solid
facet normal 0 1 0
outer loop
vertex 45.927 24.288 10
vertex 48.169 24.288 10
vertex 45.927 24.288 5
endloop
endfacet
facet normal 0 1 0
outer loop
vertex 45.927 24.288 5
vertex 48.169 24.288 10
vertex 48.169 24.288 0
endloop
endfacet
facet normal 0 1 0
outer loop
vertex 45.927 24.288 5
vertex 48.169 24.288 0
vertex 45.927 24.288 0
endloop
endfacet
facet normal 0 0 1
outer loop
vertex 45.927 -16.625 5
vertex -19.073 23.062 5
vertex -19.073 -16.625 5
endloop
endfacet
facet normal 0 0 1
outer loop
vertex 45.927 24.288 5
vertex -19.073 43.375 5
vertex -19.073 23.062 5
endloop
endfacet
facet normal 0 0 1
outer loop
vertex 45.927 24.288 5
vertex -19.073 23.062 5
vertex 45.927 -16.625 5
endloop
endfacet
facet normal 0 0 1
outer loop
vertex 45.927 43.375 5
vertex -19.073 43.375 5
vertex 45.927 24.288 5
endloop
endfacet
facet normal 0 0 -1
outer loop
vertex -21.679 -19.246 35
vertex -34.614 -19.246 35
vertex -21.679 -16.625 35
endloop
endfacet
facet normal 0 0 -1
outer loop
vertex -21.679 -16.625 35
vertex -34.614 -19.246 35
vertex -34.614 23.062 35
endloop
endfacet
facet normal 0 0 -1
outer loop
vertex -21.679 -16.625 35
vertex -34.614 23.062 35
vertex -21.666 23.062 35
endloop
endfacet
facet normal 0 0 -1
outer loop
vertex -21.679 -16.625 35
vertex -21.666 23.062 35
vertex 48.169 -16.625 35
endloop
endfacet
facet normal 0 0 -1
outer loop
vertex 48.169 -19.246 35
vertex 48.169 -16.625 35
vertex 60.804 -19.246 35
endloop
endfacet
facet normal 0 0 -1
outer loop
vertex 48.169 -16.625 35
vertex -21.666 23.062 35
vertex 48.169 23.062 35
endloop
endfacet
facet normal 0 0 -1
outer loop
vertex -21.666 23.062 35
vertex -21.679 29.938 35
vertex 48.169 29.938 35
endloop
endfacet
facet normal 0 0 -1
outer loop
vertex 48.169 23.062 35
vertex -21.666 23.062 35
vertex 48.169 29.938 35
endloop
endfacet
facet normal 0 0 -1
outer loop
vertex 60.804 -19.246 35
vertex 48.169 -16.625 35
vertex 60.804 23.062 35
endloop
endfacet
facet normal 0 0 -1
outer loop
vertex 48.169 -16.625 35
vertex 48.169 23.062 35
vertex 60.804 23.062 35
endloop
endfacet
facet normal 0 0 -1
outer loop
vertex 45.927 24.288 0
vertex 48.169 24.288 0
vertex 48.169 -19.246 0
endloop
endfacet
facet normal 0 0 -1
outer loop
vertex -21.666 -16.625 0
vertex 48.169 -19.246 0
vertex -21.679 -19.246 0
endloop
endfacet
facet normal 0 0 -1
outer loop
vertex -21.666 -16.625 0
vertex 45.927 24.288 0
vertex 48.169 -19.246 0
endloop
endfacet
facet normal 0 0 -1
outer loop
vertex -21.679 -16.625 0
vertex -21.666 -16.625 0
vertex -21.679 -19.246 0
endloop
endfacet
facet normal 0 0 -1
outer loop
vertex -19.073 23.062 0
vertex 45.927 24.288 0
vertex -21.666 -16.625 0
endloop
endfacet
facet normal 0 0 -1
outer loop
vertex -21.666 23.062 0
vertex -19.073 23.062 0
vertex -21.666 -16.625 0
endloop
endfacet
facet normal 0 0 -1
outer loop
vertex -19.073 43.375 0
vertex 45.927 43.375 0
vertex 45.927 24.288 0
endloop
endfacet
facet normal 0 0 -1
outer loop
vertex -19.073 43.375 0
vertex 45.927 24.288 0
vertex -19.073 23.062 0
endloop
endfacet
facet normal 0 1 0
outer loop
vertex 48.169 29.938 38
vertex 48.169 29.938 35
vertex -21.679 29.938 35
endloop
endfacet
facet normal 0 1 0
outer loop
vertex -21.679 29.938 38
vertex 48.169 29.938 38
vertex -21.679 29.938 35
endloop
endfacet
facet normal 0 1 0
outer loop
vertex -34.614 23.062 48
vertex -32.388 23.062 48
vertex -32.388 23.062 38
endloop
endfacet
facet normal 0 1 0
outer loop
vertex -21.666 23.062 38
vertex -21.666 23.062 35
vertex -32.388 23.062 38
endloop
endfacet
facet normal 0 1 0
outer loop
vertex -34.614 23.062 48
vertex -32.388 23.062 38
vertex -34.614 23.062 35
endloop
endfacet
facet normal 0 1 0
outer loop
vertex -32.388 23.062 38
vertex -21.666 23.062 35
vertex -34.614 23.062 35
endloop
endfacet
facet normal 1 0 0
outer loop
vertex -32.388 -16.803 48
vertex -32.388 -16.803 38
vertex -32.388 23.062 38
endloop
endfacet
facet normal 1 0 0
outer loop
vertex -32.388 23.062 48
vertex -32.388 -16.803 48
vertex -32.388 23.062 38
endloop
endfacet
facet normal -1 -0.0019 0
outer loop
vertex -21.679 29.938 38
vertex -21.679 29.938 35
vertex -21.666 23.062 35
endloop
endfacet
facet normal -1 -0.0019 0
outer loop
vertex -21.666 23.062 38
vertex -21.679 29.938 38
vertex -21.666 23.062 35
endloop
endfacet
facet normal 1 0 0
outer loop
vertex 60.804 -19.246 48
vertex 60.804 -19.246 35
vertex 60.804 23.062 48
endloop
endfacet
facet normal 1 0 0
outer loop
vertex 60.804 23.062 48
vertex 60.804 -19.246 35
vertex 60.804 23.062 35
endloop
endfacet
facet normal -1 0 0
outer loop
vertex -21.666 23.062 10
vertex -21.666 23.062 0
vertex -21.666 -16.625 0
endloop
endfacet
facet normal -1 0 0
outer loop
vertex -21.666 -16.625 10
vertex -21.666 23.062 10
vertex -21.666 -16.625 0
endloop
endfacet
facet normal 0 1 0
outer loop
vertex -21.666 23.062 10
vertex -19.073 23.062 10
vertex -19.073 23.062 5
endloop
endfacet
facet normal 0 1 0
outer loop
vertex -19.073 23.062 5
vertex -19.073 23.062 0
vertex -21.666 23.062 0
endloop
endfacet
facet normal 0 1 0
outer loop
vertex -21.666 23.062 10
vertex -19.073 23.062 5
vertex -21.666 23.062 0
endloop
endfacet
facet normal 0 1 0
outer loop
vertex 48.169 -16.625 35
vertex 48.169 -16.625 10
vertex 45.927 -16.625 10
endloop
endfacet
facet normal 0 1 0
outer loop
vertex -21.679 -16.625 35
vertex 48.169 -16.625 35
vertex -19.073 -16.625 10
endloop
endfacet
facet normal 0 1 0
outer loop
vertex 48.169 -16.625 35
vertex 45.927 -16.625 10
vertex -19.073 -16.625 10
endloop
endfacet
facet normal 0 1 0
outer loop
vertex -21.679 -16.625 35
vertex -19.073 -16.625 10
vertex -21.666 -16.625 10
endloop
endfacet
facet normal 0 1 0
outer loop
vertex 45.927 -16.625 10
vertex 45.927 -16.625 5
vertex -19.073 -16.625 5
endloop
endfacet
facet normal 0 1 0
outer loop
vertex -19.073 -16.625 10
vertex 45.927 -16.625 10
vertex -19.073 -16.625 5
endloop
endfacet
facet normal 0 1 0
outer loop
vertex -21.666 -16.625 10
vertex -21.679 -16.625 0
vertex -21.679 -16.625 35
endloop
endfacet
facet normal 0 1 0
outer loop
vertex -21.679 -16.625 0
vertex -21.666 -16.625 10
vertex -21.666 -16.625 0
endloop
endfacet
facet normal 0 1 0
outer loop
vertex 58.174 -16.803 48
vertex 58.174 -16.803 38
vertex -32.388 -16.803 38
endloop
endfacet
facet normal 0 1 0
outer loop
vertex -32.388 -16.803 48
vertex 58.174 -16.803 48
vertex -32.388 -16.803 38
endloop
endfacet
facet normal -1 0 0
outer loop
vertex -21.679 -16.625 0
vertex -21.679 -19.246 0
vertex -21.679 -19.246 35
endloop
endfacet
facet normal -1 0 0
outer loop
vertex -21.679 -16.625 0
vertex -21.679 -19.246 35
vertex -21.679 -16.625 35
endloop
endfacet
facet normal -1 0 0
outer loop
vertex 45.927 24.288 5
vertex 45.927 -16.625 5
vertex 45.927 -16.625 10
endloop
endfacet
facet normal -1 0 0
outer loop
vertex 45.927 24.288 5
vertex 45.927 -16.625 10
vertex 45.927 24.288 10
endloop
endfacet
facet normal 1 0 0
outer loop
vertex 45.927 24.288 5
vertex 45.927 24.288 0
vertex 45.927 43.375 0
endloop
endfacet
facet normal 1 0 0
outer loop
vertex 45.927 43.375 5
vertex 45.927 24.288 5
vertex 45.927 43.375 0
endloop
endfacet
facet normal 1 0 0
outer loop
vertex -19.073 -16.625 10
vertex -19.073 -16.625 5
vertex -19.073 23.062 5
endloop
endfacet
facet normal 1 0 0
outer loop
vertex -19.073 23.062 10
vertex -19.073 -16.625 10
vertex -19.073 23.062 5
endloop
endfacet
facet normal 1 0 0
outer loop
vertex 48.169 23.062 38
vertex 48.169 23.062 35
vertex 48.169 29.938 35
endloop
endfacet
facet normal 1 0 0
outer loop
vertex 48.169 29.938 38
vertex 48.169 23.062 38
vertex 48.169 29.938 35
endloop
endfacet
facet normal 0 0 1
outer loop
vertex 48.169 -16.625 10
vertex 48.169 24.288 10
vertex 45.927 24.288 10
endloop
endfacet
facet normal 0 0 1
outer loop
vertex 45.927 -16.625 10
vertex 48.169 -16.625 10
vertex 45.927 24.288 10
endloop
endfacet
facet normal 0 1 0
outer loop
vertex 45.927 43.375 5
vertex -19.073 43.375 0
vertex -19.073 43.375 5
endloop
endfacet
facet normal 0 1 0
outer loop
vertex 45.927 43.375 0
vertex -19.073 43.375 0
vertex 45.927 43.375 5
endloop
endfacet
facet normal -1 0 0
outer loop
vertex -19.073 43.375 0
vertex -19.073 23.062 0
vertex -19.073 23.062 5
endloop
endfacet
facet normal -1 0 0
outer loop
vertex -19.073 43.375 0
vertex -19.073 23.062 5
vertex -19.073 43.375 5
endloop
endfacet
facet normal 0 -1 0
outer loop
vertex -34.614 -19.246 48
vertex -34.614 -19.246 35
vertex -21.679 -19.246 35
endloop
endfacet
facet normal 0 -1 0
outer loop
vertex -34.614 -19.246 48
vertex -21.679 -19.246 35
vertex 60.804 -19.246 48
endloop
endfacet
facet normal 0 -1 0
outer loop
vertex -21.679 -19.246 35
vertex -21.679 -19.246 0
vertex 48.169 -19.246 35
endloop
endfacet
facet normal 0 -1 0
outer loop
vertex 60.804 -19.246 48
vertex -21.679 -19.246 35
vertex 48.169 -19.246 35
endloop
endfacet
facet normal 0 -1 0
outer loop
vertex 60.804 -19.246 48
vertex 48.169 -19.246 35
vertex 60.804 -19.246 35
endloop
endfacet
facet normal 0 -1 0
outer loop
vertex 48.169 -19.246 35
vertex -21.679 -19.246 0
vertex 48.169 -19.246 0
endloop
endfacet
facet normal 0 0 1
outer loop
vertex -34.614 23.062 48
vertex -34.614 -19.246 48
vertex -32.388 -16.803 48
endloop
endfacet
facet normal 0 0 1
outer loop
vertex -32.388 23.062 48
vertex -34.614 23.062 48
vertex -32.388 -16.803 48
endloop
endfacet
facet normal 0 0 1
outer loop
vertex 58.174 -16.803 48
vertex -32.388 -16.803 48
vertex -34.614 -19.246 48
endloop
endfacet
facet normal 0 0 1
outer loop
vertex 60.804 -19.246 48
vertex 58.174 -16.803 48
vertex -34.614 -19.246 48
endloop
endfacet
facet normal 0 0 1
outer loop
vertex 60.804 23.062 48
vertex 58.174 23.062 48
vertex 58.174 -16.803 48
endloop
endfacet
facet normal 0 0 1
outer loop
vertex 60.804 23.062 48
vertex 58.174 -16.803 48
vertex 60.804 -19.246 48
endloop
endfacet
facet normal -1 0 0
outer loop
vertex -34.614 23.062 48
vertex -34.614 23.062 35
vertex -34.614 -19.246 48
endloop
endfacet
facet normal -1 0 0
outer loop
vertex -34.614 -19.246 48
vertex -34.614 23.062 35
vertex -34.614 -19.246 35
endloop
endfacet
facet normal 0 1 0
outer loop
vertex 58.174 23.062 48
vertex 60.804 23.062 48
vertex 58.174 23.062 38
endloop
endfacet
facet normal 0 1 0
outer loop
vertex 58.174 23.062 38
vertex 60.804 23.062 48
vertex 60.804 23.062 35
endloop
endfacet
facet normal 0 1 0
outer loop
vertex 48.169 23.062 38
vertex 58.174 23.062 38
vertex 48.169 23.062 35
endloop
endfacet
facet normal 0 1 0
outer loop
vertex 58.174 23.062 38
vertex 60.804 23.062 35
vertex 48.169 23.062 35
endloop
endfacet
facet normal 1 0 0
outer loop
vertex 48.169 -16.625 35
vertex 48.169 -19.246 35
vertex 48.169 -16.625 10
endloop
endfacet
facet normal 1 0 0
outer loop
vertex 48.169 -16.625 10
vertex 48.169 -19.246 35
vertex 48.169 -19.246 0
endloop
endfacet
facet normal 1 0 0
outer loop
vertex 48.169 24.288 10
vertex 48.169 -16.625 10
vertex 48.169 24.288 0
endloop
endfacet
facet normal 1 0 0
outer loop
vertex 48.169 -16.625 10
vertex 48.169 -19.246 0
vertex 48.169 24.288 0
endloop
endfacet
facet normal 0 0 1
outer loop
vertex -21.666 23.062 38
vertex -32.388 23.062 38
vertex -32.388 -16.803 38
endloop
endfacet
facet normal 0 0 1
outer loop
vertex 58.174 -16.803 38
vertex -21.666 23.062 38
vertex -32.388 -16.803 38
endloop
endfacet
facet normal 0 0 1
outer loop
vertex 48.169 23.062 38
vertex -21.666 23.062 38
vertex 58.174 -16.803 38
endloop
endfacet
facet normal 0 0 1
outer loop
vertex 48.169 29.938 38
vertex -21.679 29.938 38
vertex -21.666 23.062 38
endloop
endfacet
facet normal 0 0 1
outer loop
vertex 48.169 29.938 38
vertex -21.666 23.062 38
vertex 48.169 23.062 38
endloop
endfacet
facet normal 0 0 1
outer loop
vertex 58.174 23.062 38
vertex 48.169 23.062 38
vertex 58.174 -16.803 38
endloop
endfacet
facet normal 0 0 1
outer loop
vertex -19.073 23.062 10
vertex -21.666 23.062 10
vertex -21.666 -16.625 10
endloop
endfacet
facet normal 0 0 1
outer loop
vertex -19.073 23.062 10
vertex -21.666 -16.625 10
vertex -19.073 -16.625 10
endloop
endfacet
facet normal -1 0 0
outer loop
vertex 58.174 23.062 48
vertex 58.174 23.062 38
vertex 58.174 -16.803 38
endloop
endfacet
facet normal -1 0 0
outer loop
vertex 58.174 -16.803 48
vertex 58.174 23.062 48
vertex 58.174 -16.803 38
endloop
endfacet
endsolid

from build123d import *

# Parameters (mm, degrees)
SKETCH_1_W      = 65
SKETCH_1_H      = 60
EXTRUDE_2_DEPTH = 5
SKETCH_2_W      = 2.242579202
SKETCH_2_H      = 40.913257232
EXTRUDE_3_DEPTH = 10
EXTRUDE_4_DEPTH = 10
SKETCH_4_W      = 69.848233062
SKETCH_4_H      = 2.620198038
EXTRUDE_6_DEPTH = 35
EXTRUDE_7_DEPTH = 3
EXTRUDE_9_DEPTH = 10


with BuildPart() as part:
    # 草图1 → 凸台-拉伸2 (new body)
    with BuildSketch(Plane.XY):
        with Locations((13.426561916, 13.374518887)):
            Rectangle(SKETCH_1_W, SKETCH_1_H)
    extrude(amount=EXTRUDE_2_DEPTH)

    # 草图2 → 凸台-拉伸3 (add)
    with BuildSketch(Plane(origin=(0, 0, 0), x_dir=(-1, 0, 0), z_dir=(0, 0, -1))):
        with Locations((-47.047851517, 3.831147503)):
            Rectangle(SKETCH_2_W, SKETCH_2_H)
    extrude(amount=-EXTRUDE_3_DEPTH)

    # 草图3 → 凸台-拉伸4 (add)
    with BuildSketch(Plane(origin=(0, 0, 0), x_dir=(-1, 0, 0), z_dir=(0, 0, -1))):
        Polygon((19.073438084, 23.061567441), (21.666178099, 23.061567441), (21.666178099, -16.667593717), (19.073438084, -16.625481113), align=None)
    extrude(amount=-EXTRUDE_4_DEPTH)

    # 草图4 → 凸台-拉伸6 (add)
    with BuildSketch(Plane(origin=(0, 0, 0), x_dir=(-1, 0, 0), z_dir=(0, 0, -1))):
        with Locations((-13.245024587, -17.935580132)):
            Rectangle(SKETCH_4_W, SKETCH_4_H)
    extrude(amount=-EXTRUDE_6_DEPTH)

    # 草图5 → 凸台-拉伸7 (add)
    with BuildSketch(Plane.XY.offset(35)):
        Polygon((-21.666178099, 23.061567441), (-34.613761508, 23.061567441), (-34.613761508, -19.245679151), (-21.679091944, -19.245679151), (48.169141118, -19.245679151), (60.804068806, -19.245679151), (60.804068806, 23.061567441), (48.169141118, 23.061567441), (48.169141118, 29.937605797), (-21.679091944, 29.937605797), align=None)
    extrude(amount=EXTRUDE_7_DEPTH)

    # 草图7 → 凸台-拉伸9 (add)
    with BuildSketch(Plane.XY.offset(38)):
        Polygon((-32.387714445, 23.061567441), (-34.613761508, 23.061567441), (-34.613761508, -19.245679151), (60.804068806, -19.245679151), (60.804068806, 23.061567441), (58.173614472, 23.061567441), (58.173614472, -16.803323091), (-32.387714445, -16.803323091), align=None)
    extrude(amount=EXTRUDE_9_DEPTH)


solid = part.part
